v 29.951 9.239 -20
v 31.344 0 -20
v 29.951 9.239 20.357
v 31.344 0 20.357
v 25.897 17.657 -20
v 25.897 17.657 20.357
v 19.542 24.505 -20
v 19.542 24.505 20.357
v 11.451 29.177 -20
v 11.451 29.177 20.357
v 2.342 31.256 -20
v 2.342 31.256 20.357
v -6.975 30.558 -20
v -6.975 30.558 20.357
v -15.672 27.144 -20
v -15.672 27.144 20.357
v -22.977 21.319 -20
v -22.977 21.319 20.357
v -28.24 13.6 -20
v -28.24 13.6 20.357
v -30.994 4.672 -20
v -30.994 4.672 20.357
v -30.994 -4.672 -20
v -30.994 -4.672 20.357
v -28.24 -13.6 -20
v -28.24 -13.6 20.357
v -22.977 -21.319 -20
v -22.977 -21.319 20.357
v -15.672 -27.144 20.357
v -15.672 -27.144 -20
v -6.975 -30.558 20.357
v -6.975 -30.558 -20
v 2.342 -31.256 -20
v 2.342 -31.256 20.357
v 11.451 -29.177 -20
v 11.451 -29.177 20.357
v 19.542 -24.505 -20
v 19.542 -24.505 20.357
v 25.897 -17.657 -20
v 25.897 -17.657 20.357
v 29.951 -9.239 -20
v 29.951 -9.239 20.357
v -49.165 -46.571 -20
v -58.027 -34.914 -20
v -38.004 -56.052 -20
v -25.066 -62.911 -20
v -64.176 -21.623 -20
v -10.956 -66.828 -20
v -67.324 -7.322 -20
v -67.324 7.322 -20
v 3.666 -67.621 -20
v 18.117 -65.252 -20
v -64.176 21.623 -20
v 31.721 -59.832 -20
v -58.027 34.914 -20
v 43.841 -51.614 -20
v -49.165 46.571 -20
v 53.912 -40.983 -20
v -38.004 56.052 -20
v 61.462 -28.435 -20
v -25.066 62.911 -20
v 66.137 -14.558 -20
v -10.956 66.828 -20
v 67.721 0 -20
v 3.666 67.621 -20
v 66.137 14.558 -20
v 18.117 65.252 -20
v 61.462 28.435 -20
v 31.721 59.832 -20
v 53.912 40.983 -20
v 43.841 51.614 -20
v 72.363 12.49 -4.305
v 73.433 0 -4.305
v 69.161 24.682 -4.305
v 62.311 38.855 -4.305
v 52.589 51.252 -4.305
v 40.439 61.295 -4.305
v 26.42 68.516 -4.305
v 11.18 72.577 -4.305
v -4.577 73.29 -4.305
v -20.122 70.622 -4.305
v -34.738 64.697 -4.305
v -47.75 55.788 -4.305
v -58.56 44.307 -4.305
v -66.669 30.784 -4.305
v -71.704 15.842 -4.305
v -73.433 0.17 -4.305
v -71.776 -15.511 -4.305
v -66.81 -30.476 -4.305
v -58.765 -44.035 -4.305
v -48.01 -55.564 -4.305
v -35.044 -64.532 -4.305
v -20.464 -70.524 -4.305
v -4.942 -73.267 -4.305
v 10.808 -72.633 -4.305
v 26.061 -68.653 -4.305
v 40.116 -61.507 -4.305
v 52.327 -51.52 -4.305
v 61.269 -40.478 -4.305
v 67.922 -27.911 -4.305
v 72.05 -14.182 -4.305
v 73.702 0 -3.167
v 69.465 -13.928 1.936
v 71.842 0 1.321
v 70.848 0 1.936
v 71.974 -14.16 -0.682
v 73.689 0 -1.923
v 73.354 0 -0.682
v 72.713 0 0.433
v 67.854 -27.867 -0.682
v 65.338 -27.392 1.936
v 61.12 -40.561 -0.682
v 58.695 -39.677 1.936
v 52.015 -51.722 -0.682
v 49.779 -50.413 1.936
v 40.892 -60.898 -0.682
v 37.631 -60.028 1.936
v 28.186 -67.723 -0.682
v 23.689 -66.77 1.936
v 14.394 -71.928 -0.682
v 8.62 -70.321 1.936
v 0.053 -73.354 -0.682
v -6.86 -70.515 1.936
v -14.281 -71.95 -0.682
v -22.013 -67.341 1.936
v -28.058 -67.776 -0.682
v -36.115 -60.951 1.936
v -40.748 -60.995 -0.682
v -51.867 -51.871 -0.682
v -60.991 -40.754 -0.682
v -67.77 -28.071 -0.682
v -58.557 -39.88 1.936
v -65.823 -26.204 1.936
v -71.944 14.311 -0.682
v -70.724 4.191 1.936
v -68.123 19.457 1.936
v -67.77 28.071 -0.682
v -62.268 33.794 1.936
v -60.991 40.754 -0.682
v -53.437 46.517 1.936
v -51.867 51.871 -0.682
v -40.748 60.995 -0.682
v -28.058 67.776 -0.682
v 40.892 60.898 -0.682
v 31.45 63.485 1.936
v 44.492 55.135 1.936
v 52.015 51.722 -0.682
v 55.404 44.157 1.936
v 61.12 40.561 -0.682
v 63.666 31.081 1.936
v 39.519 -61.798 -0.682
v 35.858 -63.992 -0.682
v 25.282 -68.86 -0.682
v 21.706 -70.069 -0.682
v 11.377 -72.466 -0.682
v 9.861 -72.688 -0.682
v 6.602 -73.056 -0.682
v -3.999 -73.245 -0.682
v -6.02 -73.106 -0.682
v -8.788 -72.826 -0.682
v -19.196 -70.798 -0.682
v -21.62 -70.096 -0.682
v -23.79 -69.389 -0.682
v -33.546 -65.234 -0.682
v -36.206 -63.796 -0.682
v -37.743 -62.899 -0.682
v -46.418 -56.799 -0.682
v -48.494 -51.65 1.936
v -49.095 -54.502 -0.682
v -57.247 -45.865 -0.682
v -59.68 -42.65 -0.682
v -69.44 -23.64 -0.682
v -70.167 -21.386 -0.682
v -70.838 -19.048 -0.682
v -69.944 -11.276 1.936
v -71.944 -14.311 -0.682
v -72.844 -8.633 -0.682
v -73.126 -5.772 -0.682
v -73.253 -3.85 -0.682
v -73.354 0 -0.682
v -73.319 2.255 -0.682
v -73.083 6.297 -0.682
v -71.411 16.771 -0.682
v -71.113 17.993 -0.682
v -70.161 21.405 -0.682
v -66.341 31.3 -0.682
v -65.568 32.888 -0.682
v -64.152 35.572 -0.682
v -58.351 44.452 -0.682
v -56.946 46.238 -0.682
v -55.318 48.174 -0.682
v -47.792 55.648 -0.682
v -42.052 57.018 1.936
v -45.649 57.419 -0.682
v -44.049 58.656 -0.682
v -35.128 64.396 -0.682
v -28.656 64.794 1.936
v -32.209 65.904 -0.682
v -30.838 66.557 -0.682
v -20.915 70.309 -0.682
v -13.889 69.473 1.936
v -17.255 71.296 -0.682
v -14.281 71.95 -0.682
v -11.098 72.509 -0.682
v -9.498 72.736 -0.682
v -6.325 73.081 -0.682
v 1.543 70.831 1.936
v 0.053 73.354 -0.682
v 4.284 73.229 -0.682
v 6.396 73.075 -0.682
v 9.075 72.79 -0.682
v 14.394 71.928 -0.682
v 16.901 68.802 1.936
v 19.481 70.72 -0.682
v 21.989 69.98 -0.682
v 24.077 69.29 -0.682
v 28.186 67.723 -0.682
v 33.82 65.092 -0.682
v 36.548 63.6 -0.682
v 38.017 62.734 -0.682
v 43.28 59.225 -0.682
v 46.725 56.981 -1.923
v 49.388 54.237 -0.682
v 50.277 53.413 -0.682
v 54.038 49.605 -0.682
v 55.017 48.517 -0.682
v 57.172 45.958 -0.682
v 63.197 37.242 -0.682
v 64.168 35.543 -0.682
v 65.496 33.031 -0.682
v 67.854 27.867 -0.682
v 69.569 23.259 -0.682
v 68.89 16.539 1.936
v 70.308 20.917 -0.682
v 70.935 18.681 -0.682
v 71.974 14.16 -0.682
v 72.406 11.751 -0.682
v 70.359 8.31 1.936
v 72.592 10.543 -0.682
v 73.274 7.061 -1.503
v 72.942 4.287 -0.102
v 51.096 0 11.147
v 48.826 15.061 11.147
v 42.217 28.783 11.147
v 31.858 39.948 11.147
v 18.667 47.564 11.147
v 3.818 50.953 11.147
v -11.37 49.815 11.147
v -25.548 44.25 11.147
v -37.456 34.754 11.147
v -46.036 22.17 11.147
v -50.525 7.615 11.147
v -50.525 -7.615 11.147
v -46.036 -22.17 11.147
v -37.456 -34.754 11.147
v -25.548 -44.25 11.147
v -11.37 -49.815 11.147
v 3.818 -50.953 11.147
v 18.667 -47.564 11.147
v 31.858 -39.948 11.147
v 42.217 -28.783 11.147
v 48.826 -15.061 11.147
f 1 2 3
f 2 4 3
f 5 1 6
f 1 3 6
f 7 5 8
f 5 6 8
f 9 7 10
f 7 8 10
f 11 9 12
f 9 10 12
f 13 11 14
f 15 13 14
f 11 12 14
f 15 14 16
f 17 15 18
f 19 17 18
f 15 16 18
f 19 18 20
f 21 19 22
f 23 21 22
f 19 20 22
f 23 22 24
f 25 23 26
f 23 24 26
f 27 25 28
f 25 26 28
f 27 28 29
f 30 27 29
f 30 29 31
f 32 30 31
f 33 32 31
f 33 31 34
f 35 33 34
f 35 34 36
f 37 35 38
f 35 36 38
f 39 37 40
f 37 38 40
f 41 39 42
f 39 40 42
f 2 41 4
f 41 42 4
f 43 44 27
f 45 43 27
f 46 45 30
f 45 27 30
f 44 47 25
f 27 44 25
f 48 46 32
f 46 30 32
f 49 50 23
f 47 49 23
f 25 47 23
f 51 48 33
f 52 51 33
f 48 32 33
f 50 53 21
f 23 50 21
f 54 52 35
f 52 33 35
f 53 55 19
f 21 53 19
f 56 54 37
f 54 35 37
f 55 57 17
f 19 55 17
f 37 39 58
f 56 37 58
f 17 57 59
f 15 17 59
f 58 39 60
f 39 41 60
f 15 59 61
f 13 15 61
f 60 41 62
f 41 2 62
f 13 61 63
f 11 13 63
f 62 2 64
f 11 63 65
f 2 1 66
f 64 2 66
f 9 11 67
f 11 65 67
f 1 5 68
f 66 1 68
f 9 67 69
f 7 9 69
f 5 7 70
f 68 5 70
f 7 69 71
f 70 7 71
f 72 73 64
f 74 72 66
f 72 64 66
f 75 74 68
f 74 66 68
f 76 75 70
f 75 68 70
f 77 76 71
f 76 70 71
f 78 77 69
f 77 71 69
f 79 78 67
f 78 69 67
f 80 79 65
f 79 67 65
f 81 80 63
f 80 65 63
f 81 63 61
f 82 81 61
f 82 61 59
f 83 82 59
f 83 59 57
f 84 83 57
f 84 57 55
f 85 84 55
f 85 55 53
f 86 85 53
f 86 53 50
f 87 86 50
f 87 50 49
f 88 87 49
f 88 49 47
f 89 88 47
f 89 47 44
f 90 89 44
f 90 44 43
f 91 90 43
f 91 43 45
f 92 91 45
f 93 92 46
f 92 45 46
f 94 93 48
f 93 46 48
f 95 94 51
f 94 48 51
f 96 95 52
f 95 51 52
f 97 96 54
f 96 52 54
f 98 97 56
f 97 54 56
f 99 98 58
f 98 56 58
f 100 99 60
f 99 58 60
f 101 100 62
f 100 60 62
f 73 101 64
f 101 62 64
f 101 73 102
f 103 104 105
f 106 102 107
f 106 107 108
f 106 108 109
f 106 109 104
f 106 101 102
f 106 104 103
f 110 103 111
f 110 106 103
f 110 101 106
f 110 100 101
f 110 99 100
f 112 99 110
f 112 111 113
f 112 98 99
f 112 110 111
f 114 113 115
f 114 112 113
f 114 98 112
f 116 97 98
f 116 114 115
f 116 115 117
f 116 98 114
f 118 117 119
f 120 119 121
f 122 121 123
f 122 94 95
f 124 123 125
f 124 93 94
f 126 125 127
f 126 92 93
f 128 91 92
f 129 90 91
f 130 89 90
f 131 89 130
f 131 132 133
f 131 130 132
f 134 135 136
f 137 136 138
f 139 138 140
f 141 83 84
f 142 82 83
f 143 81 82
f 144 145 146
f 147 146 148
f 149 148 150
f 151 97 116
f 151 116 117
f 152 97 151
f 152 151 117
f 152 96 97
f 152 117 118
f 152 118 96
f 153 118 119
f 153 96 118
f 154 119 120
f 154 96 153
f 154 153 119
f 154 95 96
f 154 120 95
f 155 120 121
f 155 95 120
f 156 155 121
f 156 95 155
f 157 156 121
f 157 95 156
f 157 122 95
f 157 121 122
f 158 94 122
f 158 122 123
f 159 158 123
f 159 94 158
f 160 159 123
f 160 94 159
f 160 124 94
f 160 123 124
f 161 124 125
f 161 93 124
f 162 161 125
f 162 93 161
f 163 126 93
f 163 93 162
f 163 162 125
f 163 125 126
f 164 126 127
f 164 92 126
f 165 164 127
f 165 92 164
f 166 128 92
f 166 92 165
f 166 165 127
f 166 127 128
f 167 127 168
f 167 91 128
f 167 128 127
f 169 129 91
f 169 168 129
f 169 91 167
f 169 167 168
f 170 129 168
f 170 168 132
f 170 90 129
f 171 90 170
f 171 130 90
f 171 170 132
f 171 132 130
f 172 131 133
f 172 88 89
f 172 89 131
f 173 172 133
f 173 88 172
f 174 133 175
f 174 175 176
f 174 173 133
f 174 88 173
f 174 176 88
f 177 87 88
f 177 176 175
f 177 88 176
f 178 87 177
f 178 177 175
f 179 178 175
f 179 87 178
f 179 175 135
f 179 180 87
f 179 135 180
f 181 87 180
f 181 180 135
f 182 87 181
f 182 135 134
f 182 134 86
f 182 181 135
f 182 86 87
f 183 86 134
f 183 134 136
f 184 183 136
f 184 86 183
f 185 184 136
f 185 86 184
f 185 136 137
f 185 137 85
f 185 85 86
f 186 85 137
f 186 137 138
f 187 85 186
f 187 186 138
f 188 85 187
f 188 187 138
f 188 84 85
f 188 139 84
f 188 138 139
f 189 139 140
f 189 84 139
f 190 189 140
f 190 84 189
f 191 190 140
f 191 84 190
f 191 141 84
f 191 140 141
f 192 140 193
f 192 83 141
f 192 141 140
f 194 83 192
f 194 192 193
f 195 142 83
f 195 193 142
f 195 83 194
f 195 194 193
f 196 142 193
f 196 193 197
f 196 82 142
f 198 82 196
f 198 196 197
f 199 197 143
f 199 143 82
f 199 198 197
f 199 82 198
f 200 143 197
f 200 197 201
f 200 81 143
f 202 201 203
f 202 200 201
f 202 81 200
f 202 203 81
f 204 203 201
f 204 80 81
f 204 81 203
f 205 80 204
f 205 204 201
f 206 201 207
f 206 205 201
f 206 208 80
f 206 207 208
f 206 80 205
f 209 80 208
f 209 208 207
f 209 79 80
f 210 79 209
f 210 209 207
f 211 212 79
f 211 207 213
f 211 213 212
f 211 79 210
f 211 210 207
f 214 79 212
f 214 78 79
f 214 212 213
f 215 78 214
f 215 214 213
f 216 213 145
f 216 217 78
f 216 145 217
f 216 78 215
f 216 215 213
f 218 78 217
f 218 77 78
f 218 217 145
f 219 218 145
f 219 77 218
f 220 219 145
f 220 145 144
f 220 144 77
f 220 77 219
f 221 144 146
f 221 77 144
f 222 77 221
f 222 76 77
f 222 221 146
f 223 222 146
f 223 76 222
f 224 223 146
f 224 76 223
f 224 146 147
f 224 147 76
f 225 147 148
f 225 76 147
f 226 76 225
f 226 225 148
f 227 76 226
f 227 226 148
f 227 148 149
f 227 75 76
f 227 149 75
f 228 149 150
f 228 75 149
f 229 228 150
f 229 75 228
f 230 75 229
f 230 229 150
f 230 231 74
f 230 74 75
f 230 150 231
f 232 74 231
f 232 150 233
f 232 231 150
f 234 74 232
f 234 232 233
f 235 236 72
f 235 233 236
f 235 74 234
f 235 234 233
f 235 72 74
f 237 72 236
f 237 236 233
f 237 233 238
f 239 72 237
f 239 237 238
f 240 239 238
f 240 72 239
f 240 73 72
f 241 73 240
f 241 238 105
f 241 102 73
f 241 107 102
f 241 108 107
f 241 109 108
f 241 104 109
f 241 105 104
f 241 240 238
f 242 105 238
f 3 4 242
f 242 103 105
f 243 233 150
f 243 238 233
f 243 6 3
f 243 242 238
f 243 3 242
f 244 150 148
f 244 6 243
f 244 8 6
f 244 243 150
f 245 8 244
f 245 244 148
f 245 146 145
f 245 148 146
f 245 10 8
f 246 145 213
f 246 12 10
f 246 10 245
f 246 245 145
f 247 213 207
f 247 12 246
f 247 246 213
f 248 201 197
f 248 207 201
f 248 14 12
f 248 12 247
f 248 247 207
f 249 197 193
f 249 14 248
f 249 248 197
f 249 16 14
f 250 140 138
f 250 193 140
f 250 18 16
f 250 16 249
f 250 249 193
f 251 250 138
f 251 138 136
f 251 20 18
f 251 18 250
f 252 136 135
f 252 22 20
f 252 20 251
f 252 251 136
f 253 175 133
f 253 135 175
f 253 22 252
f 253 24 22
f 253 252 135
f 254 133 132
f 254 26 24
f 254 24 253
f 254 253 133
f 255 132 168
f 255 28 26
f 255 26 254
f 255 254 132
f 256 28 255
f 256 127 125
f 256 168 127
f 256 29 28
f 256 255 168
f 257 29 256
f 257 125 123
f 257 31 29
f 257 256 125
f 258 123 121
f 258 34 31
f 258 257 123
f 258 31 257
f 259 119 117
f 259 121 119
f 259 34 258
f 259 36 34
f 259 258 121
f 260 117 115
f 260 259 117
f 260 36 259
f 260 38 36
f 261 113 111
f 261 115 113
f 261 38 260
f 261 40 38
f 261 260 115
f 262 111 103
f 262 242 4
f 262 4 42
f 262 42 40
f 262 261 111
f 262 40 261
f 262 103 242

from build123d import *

# Parameters (mm, degrees)
F0_R          = 75
F1_DEPTH      = 50
F1_TAPER      = 65
F1_DEPTH_BACK = 20
F1_TAPER_BACK = 20
F2_R          = 5
F3_R          = 31.3436912466
F4_DEPTH      = 50
F4_DEPTH_BACK = 25


with BuildPart() as f1:
    # F0 (on Top) → F1 (new body, two sides)
    with BuildSketch(Plane.XY) as f1_sk:
        Circle(F0_R)
    extrude(amount=F1_DEPTH, taper=F1_TAPER)
    extrude(f1_sk.sketch, amount=-F1_DEPTH_BACK, taper=F1_TAPER_BACK)

    # F2
    f2_edges = [f1.edges().sort_by_distance(p)[0] for p in [
        (-75, 0, 0),
    ]]
    fillet(f2_edges, radius=F2_R)

    # F3 (on Top) → F4 (cut, two sides)
    with BuildSketch(Plane.XY) as f4_sk:
        Circle(F3_R)
    extrude(amount=F4_DEPTH, mode=Mode.SUBTRACT)
    extrude(f4_sk.sketch, amount=-F4_DEPTH_BACK, mode=Mode.SUBTRACT)


solid = f1.part
